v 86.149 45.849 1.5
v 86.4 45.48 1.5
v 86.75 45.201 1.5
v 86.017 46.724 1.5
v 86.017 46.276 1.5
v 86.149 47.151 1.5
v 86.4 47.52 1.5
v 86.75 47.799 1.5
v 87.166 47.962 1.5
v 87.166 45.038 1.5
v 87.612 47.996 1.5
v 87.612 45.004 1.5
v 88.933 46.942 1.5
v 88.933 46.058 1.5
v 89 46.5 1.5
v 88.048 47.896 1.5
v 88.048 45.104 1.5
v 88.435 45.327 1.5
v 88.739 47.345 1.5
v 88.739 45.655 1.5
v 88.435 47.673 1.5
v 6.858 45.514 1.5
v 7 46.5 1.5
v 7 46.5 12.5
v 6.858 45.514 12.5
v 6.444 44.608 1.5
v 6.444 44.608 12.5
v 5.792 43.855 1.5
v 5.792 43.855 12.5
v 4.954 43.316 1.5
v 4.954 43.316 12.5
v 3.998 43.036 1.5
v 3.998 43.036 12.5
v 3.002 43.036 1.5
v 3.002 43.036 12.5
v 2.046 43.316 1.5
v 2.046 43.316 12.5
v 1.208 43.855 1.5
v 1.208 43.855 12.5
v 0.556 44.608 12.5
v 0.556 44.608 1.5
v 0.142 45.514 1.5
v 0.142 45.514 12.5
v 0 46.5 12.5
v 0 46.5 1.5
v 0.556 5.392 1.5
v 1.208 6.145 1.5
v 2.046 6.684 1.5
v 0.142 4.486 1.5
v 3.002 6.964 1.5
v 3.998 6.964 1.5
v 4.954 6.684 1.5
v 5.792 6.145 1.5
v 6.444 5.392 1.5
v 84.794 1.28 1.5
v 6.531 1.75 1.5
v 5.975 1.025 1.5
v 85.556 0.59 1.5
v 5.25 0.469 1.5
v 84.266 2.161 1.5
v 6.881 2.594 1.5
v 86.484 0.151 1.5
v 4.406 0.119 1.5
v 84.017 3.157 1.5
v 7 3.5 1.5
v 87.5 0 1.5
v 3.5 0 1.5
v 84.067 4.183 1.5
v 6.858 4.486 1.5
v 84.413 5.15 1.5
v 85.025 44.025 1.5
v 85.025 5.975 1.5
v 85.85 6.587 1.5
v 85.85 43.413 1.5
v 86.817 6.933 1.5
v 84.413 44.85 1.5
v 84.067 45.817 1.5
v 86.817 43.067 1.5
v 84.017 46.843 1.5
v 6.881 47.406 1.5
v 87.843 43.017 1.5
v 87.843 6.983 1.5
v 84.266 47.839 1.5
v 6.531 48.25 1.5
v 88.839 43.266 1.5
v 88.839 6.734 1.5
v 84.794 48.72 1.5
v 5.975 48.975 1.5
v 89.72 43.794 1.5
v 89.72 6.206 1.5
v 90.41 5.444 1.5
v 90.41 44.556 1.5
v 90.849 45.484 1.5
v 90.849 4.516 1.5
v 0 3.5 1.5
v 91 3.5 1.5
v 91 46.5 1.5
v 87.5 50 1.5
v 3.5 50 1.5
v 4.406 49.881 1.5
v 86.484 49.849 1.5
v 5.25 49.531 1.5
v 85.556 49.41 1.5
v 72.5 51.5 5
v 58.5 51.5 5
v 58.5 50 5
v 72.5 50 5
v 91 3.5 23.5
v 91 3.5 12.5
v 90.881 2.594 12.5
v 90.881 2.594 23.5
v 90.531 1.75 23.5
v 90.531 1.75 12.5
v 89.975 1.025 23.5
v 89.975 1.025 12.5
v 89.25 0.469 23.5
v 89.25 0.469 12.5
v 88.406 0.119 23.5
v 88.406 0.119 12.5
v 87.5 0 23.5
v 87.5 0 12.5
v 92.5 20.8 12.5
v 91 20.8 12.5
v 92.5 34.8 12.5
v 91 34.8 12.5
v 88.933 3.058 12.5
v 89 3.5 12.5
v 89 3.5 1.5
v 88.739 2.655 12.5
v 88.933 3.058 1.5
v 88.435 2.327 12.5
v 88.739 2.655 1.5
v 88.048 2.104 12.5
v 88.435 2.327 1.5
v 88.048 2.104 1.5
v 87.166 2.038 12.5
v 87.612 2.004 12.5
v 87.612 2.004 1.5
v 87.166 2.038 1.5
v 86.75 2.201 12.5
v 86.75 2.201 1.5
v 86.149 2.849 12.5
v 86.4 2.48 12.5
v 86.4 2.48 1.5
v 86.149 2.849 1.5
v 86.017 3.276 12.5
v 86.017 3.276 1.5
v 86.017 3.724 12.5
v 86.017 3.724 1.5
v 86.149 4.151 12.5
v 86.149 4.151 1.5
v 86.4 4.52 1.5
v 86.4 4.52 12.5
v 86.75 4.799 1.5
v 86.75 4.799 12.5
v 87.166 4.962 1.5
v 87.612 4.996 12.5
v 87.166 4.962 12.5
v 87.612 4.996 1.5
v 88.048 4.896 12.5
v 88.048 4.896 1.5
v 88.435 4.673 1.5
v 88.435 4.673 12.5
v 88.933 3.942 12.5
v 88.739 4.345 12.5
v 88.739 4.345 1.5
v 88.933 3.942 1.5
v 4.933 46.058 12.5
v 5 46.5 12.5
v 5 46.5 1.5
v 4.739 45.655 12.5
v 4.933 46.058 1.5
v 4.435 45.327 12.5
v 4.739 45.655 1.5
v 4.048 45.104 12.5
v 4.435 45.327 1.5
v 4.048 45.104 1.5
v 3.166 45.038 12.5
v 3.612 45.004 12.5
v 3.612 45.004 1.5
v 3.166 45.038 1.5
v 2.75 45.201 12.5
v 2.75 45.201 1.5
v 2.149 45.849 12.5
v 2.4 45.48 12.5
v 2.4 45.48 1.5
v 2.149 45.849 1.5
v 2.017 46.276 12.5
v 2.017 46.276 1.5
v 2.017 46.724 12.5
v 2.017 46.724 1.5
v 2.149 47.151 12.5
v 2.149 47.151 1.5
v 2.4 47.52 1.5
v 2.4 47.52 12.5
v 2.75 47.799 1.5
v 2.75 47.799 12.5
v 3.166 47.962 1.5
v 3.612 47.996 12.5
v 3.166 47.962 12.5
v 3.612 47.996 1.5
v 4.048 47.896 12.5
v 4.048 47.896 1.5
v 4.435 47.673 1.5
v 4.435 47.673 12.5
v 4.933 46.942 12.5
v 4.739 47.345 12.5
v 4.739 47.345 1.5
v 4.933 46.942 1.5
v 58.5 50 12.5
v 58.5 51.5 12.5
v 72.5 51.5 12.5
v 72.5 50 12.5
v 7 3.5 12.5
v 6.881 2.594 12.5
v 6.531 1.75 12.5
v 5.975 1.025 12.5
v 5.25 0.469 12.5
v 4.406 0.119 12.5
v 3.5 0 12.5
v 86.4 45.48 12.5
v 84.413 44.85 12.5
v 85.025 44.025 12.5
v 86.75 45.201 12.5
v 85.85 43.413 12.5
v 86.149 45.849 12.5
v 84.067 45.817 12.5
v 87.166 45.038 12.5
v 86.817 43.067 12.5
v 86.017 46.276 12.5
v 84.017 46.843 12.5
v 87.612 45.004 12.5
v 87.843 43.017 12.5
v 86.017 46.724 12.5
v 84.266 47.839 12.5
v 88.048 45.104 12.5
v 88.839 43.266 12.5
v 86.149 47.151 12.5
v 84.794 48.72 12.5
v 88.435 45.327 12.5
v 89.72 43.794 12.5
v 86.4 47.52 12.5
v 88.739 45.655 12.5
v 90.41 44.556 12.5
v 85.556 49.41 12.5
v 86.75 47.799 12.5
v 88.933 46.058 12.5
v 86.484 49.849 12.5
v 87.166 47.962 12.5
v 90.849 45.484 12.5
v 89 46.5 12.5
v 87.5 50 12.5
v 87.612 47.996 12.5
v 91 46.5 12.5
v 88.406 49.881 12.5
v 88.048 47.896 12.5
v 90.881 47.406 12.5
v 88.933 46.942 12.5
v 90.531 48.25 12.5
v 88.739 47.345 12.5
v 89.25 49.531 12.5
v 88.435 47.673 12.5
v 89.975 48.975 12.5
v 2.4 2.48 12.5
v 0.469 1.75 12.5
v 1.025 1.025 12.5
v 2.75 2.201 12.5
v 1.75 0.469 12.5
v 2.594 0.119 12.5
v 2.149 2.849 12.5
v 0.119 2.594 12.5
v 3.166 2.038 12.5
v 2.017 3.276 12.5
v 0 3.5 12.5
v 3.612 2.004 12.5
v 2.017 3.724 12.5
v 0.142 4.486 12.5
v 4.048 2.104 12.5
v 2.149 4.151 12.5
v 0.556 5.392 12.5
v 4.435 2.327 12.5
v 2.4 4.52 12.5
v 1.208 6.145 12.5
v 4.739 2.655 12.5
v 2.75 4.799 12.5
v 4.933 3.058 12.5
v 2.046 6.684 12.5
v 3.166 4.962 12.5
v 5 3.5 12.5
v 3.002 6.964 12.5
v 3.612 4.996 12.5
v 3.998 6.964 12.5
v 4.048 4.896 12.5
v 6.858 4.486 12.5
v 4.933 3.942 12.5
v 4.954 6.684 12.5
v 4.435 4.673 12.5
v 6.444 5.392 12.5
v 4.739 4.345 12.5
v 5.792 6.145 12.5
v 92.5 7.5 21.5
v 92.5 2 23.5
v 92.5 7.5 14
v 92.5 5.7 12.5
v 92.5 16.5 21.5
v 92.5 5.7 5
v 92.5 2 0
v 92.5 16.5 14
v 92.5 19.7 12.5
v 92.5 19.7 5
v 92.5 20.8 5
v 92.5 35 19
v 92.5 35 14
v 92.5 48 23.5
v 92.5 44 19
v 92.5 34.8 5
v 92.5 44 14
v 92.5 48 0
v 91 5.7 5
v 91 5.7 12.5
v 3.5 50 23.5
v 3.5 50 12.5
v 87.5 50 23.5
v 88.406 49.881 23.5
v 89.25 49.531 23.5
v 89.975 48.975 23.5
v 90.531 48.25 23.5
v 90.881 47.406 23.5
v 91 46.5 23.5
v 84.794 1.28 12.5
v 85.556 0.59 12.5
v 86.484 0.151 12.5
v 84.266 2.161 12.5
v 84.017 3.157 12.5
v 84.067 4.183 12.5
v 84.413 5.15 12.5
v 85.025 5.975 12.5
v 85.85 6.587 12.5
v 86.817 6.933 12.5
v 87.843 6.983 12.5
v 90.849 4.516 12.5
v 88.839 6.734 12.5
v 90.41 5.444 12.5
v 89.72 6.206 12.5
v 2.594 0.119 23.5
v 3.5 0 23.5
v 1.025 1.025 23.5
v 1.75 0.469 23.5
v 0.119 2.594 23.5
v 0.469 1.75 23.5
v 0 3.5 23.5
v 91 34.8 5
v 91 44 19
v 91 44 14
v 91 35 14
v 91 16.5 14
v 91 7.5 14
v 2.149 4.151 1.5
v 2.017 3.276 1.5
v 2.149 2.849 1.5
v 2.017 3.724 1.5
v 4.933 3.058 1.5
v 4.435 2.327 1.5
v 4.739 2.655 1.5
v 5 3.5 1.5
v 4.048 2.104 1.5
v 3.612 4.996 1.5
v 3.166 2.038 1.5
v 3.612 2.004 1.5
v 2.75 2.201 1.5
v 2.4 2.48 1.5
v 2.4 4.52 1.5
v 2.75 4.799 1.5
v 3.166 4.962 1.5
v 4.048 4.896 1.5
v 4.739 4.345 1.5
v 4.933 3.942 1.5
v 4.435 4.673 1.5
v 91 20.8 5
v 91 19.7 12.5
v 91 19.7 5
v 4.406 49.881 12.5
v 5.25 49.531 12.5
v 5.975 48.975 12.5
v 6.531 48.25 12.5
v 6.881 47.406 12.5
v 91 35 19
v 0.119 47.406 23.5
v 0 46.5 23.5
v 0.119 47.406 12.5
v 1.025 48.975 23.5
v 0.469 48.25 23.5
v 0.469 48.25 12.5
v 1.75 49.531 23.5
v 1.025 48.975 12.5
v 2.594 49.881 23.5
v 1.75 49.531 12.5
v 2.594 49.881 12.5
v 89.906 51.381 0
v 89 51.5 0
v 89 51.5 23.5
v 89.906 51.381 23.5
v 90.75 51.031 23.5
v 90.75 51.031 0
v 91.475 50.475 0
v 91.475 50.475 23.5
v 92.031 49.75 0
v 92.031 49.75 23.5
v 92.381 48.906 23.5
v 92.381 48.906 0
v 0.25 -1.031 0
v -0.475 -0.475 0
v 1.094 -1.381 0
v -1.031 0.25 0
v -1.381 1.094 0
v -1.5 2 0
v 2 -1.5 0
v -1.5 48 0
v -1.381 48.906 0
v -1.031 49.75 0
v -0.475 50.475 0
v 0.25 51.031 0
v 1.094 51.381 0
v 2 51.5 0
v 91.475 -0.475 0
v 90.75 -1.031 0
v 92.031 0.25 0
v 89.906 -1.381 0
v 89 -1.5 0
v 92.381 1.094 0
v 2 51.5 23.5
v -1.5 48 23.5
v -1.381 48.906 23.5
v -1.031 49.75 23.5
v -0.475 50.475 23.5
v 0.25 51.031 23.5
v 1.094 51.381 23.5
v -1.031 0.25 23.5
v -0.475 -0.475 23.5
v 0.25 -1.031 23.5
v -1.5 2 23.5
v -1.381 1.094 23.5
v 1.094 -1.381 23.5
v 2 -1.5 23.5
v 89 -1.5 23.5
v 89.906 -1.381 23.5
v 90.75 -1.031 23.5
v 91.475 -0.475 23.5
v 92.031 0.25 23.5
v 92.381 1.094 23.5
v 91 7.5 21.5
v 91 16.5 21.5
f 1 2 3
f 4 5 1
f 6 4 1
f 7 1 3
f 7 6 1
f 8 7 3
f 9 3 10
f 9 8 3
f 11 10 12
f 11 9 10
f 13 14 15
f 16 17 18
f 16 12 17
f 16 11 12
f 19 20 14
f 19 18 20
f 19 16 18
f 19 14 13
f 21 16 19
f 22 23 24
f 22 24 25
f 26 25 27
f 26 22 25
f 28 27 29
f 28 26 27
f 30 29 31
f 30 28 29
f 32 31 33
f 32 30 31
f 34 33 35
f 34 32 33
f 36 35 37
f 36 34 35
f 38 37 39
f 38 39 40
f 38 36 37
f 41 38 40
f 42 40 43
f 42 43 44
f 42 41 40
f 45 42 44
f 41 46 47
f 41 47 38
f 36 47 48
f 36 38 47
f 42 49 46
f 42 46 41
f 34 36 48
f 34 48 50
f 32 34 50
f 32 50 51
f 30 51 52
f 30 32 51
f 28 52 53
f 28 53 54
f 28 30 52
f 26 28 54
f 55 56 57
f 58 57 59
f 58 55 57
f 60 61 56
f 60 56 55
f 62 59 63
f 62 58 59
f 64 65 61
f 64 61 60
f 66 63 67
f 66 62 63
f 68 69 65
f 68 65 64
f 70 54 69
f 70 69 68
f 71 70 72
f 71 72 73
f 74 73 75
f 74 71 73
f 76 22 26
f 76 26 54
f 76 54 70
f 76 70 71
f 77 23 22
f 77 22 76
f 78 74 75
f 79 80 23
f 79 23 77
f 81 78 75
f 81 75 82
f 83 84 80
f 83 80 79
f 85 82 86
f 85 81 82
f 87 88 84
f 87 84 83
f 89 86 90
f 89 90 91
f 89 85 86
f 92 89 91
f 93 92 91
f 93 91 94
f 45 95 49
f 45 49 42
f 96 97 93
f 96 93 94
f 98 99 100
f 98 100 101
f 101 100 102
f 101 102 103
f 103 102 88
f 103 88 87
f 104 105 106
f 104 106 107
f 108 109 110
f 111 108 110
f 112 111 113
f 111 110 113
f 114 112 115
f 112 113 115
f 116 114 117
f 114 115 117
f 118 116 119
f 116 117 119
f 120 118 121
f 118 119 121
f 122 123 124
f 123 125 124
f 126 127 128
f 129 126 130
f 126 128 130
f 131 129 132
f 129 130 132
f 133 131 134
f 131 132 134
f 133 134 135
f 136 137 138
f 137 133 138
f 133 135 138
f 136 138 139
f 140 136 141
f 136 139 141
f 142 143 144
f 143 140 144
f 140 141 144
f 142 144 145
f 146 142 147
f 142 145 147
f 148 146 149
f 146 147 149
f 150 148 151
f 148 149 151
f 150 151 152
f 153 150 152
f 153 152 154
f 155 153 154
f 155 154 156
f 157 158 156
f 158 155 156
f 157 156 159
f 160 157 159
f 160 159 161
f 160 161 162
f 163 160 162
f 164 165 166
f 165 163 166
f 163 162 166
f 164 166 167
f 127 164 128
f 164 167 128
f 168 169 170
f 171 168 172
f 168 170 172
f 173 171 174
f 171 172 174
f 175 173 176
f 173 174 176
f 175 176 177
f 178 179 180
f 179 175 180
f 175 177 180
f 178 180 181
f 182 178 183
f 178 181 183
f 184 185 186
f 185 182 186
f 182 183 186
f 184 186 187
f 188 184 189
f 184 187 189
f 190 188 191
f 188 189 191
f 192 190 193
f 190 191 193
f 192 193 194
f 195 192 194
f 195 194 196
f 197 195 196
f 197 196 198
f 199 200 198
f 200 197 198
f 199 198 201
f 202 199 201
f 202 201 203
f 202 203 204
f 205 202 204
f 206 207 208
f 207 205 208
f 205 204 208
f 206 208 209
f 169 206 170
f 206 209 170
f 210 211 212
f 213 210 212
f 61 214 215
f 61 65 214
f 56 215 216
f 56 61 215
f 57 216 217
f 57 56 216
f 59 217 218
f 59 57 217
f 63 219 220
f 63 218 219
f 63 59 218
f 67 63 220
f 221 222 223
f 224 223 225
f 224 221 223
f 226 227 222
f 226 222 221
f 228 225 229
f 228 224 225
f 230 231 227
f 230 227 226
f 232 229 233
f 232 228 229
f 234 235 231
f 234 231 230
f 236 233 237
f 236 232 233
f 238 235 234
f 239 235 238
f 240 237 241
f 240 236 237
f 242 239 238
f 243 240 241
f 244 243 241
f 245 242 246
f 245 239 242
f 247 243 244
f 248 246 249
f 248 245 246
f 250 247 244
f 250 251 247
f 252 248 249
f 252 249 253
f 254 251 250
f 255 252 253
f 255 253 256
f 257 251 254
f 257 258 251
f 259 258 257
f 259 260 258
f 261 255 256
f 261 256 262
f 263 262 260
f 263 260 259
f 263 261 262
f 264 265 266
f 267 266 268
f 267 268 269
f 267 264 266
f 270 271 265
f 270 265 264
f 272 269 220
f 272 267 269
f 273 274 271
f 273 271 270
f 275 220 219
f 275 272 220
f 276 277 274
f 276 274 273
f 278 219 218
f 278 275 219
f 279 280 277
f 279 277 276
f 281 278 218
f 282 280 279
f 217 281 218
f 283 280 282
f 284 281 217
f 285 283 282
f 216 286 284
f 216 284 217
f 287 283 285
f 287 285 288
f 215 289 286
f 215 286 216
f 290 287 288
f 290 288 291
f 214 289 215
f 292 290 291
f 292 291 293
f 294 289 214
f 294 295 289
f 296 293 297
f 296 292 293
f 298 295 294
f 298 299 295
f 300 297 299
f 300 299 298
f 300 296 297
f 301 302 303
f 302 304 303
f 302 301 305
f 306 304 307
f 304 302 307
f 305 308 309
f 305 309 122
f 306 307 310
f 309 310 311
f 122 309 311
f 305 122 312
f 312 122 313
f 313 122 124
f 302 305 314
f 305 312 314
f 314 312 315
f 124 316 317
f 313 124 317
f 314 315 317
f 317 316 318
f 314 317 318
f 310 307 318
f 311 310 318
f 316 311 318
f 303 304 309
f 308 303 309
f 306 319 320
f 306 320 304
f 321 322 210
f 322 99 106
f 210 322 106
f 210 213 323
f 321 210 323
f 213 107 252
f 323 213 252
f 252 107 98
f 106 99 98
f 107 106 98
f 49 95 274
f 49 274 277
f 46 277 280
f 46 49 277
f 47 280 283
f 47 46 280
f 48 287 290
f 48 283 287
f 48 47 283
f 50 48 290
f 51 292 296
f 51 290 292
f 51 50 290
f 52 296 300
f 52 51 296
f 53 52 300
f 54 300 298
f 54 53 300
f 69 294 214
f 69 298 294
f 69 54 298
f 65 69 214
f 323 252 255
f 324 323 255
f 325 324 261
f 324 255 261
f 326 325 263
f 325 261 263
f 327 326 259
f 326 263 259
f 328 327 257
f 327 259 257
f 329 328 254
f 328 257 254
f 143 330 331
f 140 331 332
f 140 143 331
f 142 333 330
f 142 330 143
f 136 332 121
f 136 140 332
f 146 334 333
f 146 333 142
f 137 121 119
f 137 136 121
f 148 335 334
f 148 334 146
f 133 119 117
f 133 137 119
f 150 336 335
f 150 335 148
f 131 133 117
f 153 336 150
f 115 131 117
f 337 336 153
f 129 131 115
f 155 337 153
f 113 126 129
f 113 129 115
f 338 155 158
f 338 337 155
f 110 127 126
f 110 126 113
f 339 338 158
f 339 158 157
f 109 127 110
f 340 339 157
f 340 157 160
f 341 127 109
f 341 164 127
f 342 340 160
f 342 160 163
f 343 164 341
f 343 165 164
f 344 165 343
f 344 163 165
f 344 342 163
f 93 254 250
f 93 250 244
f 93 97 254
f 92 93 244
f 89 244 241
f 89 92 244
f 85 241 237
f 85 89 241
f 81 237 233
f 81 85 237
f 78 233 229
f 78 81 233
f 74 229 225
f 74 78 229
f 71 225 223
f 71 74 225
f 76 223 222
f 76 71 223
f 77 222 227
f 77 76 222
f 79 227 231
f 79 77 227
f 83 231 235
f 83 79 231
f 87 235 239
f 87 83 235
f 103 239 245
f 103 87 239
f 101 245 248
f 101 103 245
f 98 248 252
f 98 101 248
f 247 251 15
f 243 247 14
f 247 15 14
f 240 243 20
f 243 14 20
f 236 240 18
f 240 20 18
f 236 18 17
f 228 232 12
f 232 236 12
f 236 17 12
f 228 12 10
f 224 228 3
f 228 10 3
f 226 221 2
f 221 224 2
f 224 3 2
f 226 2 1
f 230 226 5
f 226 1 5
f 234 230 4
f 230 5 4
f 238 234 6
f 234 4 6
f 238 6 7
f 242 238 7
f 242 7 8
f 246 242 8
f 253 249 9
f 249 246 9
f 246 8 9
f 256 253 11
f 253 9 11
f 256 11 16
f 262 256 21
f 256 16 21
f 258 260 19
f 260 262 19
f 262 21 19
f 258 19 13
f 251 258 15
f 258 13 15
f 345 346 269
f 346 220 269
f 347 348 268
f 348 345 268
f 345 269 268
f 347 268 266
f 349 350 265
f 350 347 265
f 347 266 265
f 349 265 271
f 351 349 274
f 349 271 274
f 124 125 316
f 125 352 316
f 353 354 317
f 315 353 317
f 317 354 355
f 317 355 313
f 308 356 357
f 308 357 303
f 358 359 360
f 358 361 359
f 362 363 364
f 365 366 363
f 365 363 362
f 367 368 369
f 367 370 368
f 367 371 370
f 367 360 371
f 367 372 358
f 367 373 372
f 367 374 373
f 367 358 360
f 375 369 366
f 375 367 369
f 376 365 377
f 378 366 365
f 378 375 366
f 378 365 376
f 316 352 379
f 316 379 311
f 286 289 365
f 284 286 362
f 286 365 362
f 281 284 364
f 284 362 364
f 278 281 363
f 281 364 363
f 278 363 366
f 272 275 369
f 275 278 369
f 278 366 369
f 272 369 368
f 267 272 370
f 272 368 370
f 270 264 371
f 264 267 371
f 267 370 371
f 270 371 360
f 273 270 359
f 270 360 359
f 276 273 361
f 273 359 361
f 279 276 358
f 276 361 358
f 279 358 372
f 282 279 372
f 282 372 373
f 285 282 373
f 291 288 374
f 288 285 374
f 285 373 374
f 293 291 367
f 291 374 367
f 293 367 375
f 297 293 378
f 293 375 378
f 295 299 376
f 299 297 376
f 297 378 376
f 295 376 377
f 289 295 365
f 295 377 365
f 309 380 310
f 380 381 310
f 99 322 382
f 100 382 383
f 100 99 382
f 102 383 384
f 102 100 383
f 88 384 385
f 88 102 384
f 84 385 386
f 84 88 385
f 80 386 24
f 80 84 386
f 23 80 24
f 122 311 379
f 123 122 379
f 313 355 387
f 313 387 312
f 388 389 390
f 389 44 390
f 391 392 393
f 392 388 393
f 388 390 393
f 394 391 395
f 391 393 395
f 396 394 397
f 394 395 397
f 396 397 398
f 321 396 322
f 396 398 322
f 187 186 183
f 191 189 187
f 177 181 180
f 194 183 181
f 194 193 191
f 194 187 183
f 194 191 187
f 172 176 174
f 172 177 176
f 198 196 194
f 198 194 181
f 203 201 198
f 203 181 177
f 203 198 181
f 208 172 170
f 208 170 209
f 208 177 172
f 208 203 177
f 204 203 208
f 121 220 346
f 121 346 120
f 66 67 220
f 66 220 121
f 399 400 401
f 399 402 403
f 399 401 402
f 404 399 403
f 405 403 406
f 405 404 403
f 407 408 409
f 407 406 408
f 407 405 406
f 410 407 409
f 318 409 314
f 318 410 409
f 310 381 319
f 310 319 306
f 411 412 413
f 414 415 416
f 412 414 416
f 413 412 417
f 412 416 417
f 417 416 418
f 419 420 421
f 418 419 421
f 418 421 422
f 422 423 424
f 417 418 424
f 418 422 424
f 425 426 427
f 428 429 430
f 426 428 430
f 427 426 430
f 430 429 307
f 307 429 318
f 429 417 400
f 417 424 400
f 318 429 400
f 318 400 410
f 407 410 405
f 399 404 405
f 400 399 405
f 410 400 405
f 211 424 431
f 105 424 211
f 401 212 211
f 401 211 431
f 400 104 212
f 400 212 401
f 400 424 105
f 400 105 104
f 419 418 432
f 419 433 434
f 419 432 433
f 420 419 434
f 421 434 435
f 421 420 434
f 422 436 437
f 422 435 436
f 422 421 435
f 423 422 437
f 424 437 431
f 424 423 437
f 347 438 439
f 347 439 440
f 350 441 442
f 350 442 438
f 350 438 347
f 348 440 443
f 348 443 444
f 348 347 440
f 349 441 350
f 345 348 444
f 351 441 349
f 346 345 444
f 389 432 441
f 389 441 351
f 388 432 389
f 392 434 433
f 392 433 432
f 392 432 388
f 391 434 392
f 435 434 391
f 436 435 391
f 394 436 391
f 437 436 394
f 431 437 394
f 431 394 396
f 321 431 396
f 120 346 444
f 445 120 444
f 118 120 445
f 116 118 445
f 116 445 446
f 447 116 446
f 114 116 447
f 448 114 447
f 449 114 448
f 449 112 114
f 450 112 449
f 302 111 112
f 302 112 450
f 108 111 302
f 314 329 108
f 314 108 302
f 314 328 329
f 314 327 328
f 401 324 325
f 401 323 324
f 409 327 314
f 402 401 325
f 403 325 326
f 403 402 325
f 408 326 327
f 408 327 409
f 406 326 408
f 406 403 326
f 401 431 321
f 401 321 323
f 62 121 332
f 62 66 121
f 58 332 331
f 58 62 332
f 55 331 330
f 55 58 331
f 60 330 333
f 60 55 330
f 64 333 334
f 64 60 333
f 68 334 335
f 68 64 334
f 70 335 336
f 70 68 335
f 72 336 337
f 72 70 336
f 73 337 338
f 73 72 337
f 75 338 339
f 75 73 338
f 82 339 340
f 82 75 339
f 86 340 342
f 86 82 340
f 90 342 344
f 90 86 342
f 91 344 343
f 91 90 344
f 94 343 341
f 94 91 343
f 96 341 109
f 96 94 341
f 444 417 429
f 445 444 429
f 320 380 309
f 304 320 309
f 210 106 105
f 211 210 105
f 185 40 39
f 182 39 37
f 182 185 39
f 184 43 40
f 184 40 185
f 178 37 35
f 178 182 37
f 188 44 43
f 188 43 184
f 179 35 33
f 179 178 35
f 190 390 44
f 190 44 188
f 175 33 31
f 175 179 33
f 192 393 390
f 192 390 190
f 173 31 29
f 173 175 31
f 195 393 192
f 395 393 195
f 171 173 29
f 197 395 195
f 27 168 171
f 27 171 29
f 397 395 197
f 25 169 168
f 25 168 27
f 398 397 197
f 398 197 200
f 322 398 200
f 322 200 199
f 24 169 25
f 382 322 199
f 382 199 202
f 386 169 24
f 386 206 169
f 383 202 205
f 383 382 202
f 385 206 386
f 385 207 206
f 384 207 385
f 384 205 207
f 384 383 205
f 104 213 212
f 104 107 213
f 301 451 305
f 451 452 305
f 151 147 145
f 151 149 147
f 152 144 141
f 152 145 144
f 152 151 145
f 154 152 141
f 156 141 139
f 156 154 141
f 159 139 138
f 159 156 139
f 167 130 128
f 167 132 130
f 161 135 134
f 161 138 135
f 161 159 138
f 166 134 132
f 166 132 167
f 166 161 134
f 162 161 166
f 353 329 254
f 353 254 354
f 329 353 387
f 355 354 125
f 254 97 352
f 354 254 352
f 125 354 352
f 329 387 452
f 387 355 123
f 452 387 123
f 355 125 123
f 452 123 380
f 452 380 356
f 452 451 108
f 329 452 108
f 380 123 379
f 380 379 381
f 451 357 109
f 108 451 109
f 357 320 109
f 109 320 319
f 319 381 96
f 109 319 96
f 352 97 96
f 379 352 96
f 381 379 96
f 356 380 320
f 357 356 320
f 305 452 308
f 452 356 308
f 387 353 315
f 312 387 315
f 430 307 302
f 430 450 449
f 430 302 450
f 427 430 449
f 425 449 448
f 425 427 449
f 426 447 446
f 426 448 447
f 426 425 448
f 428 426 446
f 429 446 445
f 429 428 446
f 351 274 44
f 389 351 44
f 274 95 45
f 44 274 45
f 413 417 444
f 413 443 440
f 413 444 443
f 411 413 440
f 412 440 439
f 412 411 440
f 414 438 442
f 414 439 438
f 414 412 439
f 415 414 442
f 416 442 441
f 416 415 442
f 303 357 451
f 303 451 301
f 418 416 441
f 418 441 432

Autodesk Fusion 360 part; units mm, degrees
sketch "Sketch1" plane through (0, 0, 0) normal (0, 0, 1) x (1, 0, 0)
  line L0 (3.5, 0) -> (87.5, 0)
  line L1 (0, 3.5) -> (0, 46.5)
  line L2 (3.5, 50) -> (87.5, 50)
  line L3 (91, 46.5) -> (91, 3.5)
  line L4 (3.5, 0) -> (3.5, 50) construction
  line L5 (0, 3.5) -> (91, 3.5) construction
  circle A0 centre (3.5, 3.5) radius 1.5
  line L6 (87.5, 0) -> (87.5, 50) construction
  line L7 (0, 46.5) -> (91, 46.5) construction
  circle A1 centre (87.5, 3.5) radius 1.5
  circle A2 centre (87.5, 46.5) radius 1.5
  circle A3 centre (3.5, 46.5) radius 1.5
  arc A4 (3.5, 50) -> (0, 46.5) centre (3.5, 46.5) ccw
  arc A5 (91, 46.5) -> (87.5, 50) centre (87.5, 46.5) ccw
  arc A6 (0, 3.5) -> (3.5, 0) centre (3.5, 3.5) ccw
  arc A7 (87.5, 0) -> (91, 3.5) centre (87.5, 3.5) ccw
  circle A8 centre (3.5, 46.5) radius 3.5
  circle A9 centre (3.5, 3.5) radius 3.5
  circle A10 centre (87.5, 3.5) radius 3.5
  circle A11 centre (87.5, 46.5) radius 3.5
  line L8 (2, 51.5) -> (89, 51.5)
  line L9 (2, -1.5) -> (89, -1.5)
  line L10 (92.5, 2) -> (92.5, 48)
  line L11 (-1.5, 2) -> (-1.5, 48)
  arc A12 (92.5, 48) -> (89, 51.5) centre (89, 48) ccw
  arc A13 (2, 51.5) -> (-1.5, 48) centre (2, 48) ccw
  arc A14 (89, -1.5) -> (92.5, 2) centre (89, 2) ccw
  arc A15 (-1.5, 2) -> (2, -1.5) centre (2, 2) ccw
  line L12 (91, 7.5) -> (92.5, 7.5)
  line L13 (91, 16.5) -> (92.5, 16.5)
  line L14 (91, 44) -> (92.5, 44)
  line L15 (91, 35) -> (92.5, 35)
  line L16 (91, 12.7) -> (92.5, 12.7)
  line L17 (91, 19.7) -> (92.5, 19.7)
  line L18 (91, 5.7) -> (92.5, 5.7)
  line L19 (91, 34.8) -> (92.5, 34.8)
  line L20 (58.5, 50) -> (58.5, 51.5)
  line L21 (72.5, 50) -> (72.5, 51.5)
  line L22 (94, 20.8) -> (91, 20.8)
  point P0 (91, 0)
  point P1 (0, 50)
  point P2 (91, 50)
  dimension "d1" = 91
  dimension "d2" = 50
  dimension "d3" = 91
  dimension "d4" = 3.5
  dimension "d5" = 3.5
  dimension "d6" = 3
  dimension "d7" = 3.5
  dimension "d8" = 3.5
  dimension "d9" = 3
  dimension "d10" = 3
  dimension "d11" = 3
  dimension "d12" = 3.5
  dimension "d13" = 3.5
  dimension "d14" = 3.5
  dimension "d15" = 3.5
  dimension "d16" = 7
  dimension "d17" = 7
  dimension "d18" = 7
  dimension "d19" = 7
  dimension "d20" = 1.5
  dimension "d21" = 1.5
  dimension "d22" = 1.5
  dimension "d23" = 1.5
  dimension "d24" = 3.5
  dimension "d25" = 3.5
  dimension "d26" = 3.5
  dimension "d27" = 3.5
  dimension "d28" = 7.5
  dimension "d29" = 9
  dimension "d30" = 6
  dimension "d31" = 9
  dimension "d32" = 12.7
  dimension "d34" = 7
  dimension "d35" = 7
extrude "Extrude1" add sketch "Sketch1" along normal blind 1.5 contours L0 L1 L2 L3 A8 A9 A10 A11 | L0 L1 L2 L3 A4 A6 A7 A8 A9 A10 L8 L9 L10 L11 A13 A14 A15 L18 L20 | A6 A9 | A7 A10 | A4 A8 | L3 L10 L12 L18 | L3 L10 L12 L16 | L2 L8 L20 L21 | L3 L10 L13 L16 | L2 L3 A5 A11 L8 L10 A12 L14 L21 | L3 L10 L13 L17 | A5 A11 | L3 L10 L17 L22 | L3 L10 L19 L22 | L3 L10 L14 L15 | A0 | A1 | A2 | A3
extrude "Extrude2" add sketch "Sketch1" along normal blind 12.5 contours A6 A9 | A7 A10 | A4 A8 | A5 A11
extrude "Extrude3" add sketch "Sketch1" along normal blind 23.5 contours L0 L1 L2 L3 A4 A6 A7 A8 A9 A10 L8 L9 L10 L11 A13 A14 A15 L18 L20 | L3 L10 L12 L18 | L3 L10 L12 L16 | L2 L8 L20 L21 | L3 L10 L13 L16 | L2 L3 A5 A11 L8 L10 A12 L14 L21 | L3 L10 L13 L17 | L3 L10 L17 L22 | L3 L10 L19 L22 | L3 L10 L14 L15 | L3 L10 L15 L19
extrude "Extrude4" cut sketch "Sketch1" along normal blind 7.5 from surface at 5 contours L3 L10 L12 L18 | L3 L10 L12 L16 | L2 L8 L20 L21 | L3 L10 L13 L16 | L3 L10 L13 L17 | L3 L10 L19 L22
extrude "Extrude5" cut sketch "Sketch1" along normal blind 7.5 from surface at 14 contours L3 L10 L12 L16 | L3 L10 L13 L16
extrude "Extrude6" cut sketch "Sketch1" along normal blind 5 from surface at 14 contours L3 L10 L14 L15
